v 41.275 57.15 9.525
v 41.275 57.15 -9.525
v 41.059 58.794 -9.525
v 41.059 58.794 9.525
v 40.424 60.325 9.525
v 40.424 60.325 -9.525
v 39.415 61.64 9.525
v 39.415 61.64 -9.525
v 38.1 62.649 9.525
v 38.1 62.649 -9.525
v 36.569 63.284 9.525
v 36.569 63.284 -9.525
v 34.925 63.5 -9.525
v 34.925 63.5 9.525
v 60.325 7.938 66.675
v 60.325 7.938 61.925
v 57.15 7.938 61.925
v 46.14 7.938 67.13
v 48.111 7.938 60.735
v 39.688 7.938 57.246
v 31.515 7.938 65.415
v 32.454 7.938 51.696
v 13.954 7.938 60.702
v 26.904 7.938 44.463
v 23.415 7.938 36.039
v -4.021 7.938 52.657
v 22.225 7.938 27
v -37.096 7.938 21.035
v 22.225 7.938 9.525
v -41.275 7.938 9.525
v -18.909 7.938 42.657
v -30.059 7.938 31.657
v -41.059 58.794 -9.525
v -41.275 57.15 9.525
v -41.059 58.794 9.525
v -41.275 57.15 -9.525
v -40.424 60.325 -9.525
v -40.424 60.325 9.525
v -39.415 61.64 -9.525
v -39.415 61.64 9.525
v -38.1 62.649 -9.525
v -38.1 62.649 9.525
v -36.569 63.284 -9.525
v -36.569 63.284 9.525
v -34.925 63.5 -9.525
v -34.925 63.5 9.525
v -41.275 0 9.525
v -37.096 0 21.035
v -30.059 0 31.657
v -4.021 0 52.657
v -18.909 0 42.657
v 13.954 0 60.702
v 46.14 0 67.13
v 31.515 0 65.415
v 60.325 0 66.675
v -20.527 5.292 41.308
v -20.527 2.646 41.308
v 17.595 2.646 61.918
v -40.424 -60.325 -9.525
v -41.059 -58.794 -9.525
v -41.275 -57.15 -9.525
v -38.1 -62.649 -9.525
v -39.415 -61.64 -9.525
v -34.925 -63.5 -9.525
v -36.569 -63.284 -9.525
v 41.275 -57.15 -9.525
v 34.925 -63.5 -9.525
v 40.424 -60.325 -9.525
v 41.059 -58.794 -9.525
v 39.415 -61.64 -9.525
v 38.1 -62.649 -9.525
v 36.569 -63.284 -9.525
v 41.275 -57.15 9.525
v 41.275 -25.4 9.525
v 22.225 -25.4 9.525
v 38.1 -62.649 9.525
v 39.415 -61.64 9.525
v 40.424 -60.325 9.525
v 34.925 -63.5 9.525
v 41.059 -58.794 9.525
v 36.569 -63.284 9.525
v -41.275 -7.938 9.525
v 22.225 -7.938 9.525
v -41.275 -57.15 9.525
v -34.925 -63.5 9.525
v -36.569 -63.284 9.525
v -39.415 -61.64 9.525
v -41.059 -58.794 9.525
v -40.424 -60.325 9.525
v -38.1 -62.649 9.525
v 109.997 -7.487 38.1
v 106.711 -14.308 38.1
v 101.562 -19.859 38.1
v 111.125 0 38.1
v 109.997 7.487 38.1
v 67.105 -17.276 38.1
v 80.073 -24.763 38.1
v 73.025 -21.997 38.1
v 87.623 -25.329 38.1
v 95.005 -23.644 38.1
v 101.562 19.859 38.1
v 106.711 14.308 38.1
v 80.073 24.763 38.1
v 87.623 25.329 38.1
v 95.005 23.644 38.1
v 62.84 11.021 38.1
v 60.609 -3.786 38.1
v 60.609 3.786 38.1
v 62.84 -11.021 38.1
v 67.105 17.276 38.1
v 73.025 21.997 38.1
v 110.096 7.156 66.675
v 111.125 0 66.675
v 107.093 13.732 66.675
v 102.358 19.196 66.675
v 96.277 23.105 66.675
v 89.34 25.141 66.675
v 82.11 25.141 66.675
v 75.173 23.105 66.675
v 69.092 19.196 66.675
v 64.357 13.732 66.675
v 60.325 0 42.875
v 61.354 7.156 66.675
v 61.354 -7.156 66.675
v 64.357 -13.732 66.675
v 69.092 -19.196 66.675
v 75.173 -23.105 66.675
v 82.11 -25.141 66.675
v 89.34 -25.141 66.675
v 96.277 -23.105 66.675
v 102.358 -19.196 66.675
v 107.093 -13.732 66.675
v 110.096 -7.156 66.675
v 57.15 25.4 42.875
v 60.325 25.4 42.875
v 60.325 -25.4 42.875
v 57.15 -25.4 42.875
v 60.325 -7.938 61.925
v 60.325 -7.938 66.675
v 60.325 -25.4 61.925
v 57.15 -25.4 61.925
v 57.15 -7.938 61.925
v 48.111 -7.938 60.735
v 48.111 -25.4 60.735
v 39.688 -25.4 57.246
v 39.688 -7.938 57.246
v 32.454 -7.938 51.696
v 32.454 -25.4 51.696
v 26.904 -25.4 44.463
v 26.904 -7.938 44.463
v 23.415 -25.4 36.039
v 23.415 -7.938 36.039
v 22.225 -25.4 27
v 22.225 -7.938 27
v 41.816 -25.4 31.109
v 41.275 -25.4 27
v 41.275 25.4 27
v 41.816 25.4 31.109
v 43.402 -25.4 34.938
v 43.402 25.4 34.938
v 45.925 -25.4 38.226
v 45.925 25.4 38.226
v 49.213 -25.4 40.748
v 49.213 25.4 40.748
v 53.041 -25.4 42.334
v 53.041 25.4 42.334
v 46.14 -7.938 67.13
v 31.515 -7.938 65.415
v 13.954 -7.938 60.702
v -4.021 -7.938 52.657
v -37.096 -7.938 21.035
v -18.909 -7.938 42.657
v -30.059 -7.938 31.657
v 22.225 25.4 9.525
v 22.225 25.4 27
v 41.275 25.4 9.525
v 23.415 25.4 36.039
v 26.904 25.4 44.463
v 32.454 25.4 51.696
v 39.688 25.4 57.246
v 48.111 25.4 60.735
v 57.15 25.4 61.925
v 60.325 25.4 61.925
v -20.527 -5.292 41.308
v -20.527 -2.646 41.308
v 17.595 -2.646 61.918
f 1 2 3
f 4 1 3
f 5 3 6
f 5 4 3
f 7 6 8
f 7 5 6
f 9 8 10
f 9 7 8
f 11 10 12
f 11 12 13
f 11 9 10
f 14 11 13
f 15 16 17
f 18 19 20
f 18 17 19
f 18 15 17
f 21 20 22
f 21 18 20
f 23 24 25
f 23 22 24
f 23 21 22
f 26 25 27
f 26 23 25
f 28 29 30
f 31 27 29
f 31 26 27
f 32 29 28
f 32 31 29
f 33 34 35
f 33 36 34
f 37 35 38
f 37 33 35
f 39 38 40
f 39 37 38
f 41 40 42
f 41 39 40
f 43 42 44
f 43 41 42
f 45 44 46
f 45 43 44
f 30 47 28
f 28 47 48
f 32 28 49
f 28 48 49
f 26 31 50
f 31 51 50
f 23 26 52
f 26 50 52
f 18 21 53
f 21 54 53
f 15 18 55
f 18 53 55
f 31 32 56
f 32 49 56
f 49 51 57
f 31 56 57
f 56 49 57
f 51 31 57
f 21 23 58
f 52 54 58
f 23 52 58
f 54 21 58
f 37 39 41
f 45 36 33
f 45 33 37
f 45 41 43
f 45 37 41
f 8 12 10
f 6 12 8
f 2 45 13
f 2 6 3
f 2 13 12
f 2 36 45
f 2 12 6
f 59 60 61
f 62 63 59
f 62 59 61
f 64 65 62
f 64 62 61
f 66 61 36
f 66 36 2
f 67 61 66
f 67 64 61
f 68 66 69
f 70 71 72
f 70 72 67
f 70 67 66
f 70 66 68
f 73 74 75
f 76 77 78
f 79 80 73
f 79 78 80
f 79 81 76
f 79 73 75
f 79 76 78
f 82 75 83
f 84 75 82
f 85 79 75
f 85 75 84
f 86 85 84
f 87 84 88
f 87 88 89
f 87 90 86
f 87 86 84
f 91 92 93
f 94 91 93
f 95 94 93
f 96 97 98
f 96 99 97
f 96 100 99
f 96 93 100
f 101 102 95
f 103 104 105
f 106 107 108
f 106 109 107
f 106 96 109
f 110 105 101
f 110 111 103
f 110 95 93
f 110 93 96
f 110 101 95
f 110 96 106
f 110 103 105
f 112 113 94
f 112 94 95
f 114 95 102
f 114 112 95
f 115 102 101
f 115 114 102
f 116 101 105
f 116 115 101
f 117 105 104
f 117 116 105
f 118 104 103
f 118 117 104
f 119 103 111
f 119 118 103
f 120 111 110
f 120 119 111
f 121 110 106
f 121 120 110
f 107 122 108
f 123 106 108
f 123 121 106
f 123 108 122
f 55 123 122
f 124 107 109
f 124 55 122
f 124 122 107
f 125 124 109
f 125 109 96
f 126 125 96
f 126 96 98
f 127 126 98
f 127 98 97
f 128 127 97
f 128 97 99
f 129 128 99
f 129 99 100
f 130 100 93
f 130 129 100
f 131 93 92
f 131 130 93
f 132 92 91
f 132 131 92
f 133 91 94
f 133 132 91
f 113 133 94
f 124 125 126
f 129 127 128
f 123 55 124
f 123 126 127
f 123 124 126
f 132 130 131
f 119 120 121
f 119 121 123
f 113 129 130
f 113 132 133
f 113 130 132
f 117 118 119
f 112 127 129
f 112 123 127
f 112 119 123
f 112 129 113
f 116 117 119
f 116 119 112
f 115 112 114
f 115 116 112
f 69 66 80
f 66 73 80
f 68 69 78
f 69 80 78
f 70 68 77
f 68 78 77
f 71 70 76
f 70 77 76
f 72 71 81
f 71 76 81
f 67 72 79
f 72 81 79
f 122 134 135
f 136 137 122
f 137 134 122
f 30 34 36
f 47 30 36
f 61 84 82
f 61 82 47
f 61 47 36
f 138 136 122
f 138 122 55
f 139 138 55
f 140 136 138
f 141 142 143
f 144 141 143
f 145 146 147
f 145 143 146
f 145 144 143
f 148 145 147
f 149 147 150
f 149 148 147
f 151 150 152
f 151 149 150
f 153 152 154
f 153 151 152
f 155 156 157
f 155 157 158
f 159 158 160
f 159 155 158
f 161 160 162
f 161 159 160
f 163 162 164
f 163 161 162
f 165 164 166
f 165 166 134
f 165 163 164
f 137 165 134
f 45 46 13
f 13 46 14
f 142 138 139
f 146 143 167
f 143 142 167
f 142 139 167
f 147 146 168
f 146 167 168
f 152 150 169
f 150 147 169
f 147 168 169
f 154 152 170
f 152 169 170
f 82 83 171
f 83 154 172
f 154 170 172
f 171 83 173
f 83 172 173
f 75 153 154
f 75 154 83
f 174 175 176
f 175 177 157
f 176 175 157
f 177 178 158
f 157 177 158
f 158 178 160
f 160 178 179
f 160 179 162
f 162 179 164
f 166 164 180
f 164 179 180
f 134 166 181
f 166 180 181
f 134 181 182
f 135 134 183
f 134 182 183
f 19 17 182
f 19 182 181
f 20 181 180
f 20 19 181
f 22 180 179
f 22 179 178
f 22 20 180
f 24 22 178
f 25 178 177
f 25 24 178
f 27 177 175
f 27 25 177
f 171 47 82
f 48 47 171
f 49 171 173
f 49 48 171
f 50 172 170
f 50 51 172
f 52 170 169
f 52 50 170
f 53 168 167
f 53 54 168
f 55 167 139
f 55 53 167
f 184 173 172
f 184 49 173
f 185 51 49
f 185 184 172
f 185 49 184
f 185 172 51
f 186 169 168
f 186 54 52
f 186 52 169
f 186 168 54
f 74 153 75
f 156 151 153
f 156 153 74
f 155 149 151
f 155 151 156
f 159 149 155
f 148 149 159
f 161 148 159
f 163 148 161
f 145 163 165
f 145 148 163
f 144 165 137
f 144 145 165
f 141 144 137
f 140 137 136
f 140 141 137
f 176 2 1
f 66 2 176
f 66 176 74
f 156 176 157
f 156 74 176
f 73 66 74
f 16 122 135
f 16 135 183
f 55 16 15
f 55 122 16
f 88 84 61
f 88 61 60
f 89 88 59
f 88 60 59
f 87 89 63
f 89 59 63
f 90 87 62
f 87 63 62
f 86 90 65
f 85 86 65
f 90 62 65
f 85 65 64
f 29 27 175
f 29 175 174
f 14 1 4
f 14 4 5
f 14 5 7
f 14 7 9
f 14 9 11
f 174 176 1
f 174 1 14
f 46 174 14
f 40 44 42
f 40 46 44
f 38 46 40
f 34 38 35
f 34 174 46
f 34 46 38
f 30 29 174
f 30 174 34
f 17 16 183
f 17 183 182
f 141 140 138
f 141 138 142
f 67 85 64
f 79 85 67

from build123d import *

# Parameters (mm, degrees)
F1_DEPTH = 63.5
F2_DEPTH = 25.4
F3_DEPTH = 7.9375
F5_R     = 6.35


with BuildPart() as f1:
    # F0 (on Front) → F1 (new body, symmetric)
    with BuildSketch(Plane.XZ):
        Polygon((22.225, 9.525), (-41.275, 9.525), (-41.275, -9.525), (41.275, -9.525), (41.275, 9.525), align=None)
    extrude(amount=F1_DEPTH, both=True)

    # F0 (on Front) → F2 (join, symmetric)
    with BuildSketch(Plane.XZ):
        with BuildLine():
            Line((22.225, 27.0002), (22.225, 9.525))
            Line((22.225, 9.525), (41.275, 9.525))
            Line((41.275, 9.525), (41.275, 27.0002))
            ThreePointArc((41.275, 27.0002), (45.92468, 38.22552), (57.15, 42.8752))
            Line((57.15, 42.8752), (60.325, 42.8752))
            Line((60.325, 42.8752), (60.325, 61.9252))
            Line((60.325, 61.9252), (57.15, 61.9252))
            ThreePointArc((57.15, 61.9252), (32.454296, 51.695904), (22.225, 27.0002))
        make_face()
    extrude(amount=F2_DEPTH, both=True)

    # F0 (on Front) → F3 (join, symmetric)
    with BuildSketch(Plane.XZ):
        with BuildLine():
            add(Edge.make_bspline(
                [(-41.275, 9.525), (-33.470261, 45.333379), (19.547464, 71.404947), (60.325, 66.675)],
                knots=[0, 0, 0, 0, 116.570504, 116.570504, 116.570504, 116.570504], degree=3))
            Line((-41.275, 9.525), (22.225, 9.525))
            Line((22.225, 9.525), (22.225, 27.0002))
            ThreePointArc((22.225, 27.0002), (32.454296, 51.695904), (57.15, 61.9252))
            Line((57.15, 61.9252), (60.325, 61.9252))
            Line((60.325, 61.9252), (60.325, 66.675))
        make_face()
    extrude(amount=F3_DEPTH, both=True)

    # F0 (on Front) → F4 (revolve)
    with BuildSketch(Plane.XZ):
        Polygon((111.125, 66.675), (85.725, 66.675), (85.725, 61.9252), (85.725, 38.1), (111.125, 38.1), align=None)
    revolve(axis=Axis((85.725, 0, 52.3875), (0, 0, 1)))

    # F5
    f5_edges = [f1.edges().sort_by_distance(p)[0] for p in [
        (-41.275, -63.5, 0),
        (-41.275, 63.5, 0),
        (41.275, -63.5, 0),
        (41.275, 63.5, 0),
    ]]
    fillet(f5_edges, radius=F5_R)


solid = f1.part
